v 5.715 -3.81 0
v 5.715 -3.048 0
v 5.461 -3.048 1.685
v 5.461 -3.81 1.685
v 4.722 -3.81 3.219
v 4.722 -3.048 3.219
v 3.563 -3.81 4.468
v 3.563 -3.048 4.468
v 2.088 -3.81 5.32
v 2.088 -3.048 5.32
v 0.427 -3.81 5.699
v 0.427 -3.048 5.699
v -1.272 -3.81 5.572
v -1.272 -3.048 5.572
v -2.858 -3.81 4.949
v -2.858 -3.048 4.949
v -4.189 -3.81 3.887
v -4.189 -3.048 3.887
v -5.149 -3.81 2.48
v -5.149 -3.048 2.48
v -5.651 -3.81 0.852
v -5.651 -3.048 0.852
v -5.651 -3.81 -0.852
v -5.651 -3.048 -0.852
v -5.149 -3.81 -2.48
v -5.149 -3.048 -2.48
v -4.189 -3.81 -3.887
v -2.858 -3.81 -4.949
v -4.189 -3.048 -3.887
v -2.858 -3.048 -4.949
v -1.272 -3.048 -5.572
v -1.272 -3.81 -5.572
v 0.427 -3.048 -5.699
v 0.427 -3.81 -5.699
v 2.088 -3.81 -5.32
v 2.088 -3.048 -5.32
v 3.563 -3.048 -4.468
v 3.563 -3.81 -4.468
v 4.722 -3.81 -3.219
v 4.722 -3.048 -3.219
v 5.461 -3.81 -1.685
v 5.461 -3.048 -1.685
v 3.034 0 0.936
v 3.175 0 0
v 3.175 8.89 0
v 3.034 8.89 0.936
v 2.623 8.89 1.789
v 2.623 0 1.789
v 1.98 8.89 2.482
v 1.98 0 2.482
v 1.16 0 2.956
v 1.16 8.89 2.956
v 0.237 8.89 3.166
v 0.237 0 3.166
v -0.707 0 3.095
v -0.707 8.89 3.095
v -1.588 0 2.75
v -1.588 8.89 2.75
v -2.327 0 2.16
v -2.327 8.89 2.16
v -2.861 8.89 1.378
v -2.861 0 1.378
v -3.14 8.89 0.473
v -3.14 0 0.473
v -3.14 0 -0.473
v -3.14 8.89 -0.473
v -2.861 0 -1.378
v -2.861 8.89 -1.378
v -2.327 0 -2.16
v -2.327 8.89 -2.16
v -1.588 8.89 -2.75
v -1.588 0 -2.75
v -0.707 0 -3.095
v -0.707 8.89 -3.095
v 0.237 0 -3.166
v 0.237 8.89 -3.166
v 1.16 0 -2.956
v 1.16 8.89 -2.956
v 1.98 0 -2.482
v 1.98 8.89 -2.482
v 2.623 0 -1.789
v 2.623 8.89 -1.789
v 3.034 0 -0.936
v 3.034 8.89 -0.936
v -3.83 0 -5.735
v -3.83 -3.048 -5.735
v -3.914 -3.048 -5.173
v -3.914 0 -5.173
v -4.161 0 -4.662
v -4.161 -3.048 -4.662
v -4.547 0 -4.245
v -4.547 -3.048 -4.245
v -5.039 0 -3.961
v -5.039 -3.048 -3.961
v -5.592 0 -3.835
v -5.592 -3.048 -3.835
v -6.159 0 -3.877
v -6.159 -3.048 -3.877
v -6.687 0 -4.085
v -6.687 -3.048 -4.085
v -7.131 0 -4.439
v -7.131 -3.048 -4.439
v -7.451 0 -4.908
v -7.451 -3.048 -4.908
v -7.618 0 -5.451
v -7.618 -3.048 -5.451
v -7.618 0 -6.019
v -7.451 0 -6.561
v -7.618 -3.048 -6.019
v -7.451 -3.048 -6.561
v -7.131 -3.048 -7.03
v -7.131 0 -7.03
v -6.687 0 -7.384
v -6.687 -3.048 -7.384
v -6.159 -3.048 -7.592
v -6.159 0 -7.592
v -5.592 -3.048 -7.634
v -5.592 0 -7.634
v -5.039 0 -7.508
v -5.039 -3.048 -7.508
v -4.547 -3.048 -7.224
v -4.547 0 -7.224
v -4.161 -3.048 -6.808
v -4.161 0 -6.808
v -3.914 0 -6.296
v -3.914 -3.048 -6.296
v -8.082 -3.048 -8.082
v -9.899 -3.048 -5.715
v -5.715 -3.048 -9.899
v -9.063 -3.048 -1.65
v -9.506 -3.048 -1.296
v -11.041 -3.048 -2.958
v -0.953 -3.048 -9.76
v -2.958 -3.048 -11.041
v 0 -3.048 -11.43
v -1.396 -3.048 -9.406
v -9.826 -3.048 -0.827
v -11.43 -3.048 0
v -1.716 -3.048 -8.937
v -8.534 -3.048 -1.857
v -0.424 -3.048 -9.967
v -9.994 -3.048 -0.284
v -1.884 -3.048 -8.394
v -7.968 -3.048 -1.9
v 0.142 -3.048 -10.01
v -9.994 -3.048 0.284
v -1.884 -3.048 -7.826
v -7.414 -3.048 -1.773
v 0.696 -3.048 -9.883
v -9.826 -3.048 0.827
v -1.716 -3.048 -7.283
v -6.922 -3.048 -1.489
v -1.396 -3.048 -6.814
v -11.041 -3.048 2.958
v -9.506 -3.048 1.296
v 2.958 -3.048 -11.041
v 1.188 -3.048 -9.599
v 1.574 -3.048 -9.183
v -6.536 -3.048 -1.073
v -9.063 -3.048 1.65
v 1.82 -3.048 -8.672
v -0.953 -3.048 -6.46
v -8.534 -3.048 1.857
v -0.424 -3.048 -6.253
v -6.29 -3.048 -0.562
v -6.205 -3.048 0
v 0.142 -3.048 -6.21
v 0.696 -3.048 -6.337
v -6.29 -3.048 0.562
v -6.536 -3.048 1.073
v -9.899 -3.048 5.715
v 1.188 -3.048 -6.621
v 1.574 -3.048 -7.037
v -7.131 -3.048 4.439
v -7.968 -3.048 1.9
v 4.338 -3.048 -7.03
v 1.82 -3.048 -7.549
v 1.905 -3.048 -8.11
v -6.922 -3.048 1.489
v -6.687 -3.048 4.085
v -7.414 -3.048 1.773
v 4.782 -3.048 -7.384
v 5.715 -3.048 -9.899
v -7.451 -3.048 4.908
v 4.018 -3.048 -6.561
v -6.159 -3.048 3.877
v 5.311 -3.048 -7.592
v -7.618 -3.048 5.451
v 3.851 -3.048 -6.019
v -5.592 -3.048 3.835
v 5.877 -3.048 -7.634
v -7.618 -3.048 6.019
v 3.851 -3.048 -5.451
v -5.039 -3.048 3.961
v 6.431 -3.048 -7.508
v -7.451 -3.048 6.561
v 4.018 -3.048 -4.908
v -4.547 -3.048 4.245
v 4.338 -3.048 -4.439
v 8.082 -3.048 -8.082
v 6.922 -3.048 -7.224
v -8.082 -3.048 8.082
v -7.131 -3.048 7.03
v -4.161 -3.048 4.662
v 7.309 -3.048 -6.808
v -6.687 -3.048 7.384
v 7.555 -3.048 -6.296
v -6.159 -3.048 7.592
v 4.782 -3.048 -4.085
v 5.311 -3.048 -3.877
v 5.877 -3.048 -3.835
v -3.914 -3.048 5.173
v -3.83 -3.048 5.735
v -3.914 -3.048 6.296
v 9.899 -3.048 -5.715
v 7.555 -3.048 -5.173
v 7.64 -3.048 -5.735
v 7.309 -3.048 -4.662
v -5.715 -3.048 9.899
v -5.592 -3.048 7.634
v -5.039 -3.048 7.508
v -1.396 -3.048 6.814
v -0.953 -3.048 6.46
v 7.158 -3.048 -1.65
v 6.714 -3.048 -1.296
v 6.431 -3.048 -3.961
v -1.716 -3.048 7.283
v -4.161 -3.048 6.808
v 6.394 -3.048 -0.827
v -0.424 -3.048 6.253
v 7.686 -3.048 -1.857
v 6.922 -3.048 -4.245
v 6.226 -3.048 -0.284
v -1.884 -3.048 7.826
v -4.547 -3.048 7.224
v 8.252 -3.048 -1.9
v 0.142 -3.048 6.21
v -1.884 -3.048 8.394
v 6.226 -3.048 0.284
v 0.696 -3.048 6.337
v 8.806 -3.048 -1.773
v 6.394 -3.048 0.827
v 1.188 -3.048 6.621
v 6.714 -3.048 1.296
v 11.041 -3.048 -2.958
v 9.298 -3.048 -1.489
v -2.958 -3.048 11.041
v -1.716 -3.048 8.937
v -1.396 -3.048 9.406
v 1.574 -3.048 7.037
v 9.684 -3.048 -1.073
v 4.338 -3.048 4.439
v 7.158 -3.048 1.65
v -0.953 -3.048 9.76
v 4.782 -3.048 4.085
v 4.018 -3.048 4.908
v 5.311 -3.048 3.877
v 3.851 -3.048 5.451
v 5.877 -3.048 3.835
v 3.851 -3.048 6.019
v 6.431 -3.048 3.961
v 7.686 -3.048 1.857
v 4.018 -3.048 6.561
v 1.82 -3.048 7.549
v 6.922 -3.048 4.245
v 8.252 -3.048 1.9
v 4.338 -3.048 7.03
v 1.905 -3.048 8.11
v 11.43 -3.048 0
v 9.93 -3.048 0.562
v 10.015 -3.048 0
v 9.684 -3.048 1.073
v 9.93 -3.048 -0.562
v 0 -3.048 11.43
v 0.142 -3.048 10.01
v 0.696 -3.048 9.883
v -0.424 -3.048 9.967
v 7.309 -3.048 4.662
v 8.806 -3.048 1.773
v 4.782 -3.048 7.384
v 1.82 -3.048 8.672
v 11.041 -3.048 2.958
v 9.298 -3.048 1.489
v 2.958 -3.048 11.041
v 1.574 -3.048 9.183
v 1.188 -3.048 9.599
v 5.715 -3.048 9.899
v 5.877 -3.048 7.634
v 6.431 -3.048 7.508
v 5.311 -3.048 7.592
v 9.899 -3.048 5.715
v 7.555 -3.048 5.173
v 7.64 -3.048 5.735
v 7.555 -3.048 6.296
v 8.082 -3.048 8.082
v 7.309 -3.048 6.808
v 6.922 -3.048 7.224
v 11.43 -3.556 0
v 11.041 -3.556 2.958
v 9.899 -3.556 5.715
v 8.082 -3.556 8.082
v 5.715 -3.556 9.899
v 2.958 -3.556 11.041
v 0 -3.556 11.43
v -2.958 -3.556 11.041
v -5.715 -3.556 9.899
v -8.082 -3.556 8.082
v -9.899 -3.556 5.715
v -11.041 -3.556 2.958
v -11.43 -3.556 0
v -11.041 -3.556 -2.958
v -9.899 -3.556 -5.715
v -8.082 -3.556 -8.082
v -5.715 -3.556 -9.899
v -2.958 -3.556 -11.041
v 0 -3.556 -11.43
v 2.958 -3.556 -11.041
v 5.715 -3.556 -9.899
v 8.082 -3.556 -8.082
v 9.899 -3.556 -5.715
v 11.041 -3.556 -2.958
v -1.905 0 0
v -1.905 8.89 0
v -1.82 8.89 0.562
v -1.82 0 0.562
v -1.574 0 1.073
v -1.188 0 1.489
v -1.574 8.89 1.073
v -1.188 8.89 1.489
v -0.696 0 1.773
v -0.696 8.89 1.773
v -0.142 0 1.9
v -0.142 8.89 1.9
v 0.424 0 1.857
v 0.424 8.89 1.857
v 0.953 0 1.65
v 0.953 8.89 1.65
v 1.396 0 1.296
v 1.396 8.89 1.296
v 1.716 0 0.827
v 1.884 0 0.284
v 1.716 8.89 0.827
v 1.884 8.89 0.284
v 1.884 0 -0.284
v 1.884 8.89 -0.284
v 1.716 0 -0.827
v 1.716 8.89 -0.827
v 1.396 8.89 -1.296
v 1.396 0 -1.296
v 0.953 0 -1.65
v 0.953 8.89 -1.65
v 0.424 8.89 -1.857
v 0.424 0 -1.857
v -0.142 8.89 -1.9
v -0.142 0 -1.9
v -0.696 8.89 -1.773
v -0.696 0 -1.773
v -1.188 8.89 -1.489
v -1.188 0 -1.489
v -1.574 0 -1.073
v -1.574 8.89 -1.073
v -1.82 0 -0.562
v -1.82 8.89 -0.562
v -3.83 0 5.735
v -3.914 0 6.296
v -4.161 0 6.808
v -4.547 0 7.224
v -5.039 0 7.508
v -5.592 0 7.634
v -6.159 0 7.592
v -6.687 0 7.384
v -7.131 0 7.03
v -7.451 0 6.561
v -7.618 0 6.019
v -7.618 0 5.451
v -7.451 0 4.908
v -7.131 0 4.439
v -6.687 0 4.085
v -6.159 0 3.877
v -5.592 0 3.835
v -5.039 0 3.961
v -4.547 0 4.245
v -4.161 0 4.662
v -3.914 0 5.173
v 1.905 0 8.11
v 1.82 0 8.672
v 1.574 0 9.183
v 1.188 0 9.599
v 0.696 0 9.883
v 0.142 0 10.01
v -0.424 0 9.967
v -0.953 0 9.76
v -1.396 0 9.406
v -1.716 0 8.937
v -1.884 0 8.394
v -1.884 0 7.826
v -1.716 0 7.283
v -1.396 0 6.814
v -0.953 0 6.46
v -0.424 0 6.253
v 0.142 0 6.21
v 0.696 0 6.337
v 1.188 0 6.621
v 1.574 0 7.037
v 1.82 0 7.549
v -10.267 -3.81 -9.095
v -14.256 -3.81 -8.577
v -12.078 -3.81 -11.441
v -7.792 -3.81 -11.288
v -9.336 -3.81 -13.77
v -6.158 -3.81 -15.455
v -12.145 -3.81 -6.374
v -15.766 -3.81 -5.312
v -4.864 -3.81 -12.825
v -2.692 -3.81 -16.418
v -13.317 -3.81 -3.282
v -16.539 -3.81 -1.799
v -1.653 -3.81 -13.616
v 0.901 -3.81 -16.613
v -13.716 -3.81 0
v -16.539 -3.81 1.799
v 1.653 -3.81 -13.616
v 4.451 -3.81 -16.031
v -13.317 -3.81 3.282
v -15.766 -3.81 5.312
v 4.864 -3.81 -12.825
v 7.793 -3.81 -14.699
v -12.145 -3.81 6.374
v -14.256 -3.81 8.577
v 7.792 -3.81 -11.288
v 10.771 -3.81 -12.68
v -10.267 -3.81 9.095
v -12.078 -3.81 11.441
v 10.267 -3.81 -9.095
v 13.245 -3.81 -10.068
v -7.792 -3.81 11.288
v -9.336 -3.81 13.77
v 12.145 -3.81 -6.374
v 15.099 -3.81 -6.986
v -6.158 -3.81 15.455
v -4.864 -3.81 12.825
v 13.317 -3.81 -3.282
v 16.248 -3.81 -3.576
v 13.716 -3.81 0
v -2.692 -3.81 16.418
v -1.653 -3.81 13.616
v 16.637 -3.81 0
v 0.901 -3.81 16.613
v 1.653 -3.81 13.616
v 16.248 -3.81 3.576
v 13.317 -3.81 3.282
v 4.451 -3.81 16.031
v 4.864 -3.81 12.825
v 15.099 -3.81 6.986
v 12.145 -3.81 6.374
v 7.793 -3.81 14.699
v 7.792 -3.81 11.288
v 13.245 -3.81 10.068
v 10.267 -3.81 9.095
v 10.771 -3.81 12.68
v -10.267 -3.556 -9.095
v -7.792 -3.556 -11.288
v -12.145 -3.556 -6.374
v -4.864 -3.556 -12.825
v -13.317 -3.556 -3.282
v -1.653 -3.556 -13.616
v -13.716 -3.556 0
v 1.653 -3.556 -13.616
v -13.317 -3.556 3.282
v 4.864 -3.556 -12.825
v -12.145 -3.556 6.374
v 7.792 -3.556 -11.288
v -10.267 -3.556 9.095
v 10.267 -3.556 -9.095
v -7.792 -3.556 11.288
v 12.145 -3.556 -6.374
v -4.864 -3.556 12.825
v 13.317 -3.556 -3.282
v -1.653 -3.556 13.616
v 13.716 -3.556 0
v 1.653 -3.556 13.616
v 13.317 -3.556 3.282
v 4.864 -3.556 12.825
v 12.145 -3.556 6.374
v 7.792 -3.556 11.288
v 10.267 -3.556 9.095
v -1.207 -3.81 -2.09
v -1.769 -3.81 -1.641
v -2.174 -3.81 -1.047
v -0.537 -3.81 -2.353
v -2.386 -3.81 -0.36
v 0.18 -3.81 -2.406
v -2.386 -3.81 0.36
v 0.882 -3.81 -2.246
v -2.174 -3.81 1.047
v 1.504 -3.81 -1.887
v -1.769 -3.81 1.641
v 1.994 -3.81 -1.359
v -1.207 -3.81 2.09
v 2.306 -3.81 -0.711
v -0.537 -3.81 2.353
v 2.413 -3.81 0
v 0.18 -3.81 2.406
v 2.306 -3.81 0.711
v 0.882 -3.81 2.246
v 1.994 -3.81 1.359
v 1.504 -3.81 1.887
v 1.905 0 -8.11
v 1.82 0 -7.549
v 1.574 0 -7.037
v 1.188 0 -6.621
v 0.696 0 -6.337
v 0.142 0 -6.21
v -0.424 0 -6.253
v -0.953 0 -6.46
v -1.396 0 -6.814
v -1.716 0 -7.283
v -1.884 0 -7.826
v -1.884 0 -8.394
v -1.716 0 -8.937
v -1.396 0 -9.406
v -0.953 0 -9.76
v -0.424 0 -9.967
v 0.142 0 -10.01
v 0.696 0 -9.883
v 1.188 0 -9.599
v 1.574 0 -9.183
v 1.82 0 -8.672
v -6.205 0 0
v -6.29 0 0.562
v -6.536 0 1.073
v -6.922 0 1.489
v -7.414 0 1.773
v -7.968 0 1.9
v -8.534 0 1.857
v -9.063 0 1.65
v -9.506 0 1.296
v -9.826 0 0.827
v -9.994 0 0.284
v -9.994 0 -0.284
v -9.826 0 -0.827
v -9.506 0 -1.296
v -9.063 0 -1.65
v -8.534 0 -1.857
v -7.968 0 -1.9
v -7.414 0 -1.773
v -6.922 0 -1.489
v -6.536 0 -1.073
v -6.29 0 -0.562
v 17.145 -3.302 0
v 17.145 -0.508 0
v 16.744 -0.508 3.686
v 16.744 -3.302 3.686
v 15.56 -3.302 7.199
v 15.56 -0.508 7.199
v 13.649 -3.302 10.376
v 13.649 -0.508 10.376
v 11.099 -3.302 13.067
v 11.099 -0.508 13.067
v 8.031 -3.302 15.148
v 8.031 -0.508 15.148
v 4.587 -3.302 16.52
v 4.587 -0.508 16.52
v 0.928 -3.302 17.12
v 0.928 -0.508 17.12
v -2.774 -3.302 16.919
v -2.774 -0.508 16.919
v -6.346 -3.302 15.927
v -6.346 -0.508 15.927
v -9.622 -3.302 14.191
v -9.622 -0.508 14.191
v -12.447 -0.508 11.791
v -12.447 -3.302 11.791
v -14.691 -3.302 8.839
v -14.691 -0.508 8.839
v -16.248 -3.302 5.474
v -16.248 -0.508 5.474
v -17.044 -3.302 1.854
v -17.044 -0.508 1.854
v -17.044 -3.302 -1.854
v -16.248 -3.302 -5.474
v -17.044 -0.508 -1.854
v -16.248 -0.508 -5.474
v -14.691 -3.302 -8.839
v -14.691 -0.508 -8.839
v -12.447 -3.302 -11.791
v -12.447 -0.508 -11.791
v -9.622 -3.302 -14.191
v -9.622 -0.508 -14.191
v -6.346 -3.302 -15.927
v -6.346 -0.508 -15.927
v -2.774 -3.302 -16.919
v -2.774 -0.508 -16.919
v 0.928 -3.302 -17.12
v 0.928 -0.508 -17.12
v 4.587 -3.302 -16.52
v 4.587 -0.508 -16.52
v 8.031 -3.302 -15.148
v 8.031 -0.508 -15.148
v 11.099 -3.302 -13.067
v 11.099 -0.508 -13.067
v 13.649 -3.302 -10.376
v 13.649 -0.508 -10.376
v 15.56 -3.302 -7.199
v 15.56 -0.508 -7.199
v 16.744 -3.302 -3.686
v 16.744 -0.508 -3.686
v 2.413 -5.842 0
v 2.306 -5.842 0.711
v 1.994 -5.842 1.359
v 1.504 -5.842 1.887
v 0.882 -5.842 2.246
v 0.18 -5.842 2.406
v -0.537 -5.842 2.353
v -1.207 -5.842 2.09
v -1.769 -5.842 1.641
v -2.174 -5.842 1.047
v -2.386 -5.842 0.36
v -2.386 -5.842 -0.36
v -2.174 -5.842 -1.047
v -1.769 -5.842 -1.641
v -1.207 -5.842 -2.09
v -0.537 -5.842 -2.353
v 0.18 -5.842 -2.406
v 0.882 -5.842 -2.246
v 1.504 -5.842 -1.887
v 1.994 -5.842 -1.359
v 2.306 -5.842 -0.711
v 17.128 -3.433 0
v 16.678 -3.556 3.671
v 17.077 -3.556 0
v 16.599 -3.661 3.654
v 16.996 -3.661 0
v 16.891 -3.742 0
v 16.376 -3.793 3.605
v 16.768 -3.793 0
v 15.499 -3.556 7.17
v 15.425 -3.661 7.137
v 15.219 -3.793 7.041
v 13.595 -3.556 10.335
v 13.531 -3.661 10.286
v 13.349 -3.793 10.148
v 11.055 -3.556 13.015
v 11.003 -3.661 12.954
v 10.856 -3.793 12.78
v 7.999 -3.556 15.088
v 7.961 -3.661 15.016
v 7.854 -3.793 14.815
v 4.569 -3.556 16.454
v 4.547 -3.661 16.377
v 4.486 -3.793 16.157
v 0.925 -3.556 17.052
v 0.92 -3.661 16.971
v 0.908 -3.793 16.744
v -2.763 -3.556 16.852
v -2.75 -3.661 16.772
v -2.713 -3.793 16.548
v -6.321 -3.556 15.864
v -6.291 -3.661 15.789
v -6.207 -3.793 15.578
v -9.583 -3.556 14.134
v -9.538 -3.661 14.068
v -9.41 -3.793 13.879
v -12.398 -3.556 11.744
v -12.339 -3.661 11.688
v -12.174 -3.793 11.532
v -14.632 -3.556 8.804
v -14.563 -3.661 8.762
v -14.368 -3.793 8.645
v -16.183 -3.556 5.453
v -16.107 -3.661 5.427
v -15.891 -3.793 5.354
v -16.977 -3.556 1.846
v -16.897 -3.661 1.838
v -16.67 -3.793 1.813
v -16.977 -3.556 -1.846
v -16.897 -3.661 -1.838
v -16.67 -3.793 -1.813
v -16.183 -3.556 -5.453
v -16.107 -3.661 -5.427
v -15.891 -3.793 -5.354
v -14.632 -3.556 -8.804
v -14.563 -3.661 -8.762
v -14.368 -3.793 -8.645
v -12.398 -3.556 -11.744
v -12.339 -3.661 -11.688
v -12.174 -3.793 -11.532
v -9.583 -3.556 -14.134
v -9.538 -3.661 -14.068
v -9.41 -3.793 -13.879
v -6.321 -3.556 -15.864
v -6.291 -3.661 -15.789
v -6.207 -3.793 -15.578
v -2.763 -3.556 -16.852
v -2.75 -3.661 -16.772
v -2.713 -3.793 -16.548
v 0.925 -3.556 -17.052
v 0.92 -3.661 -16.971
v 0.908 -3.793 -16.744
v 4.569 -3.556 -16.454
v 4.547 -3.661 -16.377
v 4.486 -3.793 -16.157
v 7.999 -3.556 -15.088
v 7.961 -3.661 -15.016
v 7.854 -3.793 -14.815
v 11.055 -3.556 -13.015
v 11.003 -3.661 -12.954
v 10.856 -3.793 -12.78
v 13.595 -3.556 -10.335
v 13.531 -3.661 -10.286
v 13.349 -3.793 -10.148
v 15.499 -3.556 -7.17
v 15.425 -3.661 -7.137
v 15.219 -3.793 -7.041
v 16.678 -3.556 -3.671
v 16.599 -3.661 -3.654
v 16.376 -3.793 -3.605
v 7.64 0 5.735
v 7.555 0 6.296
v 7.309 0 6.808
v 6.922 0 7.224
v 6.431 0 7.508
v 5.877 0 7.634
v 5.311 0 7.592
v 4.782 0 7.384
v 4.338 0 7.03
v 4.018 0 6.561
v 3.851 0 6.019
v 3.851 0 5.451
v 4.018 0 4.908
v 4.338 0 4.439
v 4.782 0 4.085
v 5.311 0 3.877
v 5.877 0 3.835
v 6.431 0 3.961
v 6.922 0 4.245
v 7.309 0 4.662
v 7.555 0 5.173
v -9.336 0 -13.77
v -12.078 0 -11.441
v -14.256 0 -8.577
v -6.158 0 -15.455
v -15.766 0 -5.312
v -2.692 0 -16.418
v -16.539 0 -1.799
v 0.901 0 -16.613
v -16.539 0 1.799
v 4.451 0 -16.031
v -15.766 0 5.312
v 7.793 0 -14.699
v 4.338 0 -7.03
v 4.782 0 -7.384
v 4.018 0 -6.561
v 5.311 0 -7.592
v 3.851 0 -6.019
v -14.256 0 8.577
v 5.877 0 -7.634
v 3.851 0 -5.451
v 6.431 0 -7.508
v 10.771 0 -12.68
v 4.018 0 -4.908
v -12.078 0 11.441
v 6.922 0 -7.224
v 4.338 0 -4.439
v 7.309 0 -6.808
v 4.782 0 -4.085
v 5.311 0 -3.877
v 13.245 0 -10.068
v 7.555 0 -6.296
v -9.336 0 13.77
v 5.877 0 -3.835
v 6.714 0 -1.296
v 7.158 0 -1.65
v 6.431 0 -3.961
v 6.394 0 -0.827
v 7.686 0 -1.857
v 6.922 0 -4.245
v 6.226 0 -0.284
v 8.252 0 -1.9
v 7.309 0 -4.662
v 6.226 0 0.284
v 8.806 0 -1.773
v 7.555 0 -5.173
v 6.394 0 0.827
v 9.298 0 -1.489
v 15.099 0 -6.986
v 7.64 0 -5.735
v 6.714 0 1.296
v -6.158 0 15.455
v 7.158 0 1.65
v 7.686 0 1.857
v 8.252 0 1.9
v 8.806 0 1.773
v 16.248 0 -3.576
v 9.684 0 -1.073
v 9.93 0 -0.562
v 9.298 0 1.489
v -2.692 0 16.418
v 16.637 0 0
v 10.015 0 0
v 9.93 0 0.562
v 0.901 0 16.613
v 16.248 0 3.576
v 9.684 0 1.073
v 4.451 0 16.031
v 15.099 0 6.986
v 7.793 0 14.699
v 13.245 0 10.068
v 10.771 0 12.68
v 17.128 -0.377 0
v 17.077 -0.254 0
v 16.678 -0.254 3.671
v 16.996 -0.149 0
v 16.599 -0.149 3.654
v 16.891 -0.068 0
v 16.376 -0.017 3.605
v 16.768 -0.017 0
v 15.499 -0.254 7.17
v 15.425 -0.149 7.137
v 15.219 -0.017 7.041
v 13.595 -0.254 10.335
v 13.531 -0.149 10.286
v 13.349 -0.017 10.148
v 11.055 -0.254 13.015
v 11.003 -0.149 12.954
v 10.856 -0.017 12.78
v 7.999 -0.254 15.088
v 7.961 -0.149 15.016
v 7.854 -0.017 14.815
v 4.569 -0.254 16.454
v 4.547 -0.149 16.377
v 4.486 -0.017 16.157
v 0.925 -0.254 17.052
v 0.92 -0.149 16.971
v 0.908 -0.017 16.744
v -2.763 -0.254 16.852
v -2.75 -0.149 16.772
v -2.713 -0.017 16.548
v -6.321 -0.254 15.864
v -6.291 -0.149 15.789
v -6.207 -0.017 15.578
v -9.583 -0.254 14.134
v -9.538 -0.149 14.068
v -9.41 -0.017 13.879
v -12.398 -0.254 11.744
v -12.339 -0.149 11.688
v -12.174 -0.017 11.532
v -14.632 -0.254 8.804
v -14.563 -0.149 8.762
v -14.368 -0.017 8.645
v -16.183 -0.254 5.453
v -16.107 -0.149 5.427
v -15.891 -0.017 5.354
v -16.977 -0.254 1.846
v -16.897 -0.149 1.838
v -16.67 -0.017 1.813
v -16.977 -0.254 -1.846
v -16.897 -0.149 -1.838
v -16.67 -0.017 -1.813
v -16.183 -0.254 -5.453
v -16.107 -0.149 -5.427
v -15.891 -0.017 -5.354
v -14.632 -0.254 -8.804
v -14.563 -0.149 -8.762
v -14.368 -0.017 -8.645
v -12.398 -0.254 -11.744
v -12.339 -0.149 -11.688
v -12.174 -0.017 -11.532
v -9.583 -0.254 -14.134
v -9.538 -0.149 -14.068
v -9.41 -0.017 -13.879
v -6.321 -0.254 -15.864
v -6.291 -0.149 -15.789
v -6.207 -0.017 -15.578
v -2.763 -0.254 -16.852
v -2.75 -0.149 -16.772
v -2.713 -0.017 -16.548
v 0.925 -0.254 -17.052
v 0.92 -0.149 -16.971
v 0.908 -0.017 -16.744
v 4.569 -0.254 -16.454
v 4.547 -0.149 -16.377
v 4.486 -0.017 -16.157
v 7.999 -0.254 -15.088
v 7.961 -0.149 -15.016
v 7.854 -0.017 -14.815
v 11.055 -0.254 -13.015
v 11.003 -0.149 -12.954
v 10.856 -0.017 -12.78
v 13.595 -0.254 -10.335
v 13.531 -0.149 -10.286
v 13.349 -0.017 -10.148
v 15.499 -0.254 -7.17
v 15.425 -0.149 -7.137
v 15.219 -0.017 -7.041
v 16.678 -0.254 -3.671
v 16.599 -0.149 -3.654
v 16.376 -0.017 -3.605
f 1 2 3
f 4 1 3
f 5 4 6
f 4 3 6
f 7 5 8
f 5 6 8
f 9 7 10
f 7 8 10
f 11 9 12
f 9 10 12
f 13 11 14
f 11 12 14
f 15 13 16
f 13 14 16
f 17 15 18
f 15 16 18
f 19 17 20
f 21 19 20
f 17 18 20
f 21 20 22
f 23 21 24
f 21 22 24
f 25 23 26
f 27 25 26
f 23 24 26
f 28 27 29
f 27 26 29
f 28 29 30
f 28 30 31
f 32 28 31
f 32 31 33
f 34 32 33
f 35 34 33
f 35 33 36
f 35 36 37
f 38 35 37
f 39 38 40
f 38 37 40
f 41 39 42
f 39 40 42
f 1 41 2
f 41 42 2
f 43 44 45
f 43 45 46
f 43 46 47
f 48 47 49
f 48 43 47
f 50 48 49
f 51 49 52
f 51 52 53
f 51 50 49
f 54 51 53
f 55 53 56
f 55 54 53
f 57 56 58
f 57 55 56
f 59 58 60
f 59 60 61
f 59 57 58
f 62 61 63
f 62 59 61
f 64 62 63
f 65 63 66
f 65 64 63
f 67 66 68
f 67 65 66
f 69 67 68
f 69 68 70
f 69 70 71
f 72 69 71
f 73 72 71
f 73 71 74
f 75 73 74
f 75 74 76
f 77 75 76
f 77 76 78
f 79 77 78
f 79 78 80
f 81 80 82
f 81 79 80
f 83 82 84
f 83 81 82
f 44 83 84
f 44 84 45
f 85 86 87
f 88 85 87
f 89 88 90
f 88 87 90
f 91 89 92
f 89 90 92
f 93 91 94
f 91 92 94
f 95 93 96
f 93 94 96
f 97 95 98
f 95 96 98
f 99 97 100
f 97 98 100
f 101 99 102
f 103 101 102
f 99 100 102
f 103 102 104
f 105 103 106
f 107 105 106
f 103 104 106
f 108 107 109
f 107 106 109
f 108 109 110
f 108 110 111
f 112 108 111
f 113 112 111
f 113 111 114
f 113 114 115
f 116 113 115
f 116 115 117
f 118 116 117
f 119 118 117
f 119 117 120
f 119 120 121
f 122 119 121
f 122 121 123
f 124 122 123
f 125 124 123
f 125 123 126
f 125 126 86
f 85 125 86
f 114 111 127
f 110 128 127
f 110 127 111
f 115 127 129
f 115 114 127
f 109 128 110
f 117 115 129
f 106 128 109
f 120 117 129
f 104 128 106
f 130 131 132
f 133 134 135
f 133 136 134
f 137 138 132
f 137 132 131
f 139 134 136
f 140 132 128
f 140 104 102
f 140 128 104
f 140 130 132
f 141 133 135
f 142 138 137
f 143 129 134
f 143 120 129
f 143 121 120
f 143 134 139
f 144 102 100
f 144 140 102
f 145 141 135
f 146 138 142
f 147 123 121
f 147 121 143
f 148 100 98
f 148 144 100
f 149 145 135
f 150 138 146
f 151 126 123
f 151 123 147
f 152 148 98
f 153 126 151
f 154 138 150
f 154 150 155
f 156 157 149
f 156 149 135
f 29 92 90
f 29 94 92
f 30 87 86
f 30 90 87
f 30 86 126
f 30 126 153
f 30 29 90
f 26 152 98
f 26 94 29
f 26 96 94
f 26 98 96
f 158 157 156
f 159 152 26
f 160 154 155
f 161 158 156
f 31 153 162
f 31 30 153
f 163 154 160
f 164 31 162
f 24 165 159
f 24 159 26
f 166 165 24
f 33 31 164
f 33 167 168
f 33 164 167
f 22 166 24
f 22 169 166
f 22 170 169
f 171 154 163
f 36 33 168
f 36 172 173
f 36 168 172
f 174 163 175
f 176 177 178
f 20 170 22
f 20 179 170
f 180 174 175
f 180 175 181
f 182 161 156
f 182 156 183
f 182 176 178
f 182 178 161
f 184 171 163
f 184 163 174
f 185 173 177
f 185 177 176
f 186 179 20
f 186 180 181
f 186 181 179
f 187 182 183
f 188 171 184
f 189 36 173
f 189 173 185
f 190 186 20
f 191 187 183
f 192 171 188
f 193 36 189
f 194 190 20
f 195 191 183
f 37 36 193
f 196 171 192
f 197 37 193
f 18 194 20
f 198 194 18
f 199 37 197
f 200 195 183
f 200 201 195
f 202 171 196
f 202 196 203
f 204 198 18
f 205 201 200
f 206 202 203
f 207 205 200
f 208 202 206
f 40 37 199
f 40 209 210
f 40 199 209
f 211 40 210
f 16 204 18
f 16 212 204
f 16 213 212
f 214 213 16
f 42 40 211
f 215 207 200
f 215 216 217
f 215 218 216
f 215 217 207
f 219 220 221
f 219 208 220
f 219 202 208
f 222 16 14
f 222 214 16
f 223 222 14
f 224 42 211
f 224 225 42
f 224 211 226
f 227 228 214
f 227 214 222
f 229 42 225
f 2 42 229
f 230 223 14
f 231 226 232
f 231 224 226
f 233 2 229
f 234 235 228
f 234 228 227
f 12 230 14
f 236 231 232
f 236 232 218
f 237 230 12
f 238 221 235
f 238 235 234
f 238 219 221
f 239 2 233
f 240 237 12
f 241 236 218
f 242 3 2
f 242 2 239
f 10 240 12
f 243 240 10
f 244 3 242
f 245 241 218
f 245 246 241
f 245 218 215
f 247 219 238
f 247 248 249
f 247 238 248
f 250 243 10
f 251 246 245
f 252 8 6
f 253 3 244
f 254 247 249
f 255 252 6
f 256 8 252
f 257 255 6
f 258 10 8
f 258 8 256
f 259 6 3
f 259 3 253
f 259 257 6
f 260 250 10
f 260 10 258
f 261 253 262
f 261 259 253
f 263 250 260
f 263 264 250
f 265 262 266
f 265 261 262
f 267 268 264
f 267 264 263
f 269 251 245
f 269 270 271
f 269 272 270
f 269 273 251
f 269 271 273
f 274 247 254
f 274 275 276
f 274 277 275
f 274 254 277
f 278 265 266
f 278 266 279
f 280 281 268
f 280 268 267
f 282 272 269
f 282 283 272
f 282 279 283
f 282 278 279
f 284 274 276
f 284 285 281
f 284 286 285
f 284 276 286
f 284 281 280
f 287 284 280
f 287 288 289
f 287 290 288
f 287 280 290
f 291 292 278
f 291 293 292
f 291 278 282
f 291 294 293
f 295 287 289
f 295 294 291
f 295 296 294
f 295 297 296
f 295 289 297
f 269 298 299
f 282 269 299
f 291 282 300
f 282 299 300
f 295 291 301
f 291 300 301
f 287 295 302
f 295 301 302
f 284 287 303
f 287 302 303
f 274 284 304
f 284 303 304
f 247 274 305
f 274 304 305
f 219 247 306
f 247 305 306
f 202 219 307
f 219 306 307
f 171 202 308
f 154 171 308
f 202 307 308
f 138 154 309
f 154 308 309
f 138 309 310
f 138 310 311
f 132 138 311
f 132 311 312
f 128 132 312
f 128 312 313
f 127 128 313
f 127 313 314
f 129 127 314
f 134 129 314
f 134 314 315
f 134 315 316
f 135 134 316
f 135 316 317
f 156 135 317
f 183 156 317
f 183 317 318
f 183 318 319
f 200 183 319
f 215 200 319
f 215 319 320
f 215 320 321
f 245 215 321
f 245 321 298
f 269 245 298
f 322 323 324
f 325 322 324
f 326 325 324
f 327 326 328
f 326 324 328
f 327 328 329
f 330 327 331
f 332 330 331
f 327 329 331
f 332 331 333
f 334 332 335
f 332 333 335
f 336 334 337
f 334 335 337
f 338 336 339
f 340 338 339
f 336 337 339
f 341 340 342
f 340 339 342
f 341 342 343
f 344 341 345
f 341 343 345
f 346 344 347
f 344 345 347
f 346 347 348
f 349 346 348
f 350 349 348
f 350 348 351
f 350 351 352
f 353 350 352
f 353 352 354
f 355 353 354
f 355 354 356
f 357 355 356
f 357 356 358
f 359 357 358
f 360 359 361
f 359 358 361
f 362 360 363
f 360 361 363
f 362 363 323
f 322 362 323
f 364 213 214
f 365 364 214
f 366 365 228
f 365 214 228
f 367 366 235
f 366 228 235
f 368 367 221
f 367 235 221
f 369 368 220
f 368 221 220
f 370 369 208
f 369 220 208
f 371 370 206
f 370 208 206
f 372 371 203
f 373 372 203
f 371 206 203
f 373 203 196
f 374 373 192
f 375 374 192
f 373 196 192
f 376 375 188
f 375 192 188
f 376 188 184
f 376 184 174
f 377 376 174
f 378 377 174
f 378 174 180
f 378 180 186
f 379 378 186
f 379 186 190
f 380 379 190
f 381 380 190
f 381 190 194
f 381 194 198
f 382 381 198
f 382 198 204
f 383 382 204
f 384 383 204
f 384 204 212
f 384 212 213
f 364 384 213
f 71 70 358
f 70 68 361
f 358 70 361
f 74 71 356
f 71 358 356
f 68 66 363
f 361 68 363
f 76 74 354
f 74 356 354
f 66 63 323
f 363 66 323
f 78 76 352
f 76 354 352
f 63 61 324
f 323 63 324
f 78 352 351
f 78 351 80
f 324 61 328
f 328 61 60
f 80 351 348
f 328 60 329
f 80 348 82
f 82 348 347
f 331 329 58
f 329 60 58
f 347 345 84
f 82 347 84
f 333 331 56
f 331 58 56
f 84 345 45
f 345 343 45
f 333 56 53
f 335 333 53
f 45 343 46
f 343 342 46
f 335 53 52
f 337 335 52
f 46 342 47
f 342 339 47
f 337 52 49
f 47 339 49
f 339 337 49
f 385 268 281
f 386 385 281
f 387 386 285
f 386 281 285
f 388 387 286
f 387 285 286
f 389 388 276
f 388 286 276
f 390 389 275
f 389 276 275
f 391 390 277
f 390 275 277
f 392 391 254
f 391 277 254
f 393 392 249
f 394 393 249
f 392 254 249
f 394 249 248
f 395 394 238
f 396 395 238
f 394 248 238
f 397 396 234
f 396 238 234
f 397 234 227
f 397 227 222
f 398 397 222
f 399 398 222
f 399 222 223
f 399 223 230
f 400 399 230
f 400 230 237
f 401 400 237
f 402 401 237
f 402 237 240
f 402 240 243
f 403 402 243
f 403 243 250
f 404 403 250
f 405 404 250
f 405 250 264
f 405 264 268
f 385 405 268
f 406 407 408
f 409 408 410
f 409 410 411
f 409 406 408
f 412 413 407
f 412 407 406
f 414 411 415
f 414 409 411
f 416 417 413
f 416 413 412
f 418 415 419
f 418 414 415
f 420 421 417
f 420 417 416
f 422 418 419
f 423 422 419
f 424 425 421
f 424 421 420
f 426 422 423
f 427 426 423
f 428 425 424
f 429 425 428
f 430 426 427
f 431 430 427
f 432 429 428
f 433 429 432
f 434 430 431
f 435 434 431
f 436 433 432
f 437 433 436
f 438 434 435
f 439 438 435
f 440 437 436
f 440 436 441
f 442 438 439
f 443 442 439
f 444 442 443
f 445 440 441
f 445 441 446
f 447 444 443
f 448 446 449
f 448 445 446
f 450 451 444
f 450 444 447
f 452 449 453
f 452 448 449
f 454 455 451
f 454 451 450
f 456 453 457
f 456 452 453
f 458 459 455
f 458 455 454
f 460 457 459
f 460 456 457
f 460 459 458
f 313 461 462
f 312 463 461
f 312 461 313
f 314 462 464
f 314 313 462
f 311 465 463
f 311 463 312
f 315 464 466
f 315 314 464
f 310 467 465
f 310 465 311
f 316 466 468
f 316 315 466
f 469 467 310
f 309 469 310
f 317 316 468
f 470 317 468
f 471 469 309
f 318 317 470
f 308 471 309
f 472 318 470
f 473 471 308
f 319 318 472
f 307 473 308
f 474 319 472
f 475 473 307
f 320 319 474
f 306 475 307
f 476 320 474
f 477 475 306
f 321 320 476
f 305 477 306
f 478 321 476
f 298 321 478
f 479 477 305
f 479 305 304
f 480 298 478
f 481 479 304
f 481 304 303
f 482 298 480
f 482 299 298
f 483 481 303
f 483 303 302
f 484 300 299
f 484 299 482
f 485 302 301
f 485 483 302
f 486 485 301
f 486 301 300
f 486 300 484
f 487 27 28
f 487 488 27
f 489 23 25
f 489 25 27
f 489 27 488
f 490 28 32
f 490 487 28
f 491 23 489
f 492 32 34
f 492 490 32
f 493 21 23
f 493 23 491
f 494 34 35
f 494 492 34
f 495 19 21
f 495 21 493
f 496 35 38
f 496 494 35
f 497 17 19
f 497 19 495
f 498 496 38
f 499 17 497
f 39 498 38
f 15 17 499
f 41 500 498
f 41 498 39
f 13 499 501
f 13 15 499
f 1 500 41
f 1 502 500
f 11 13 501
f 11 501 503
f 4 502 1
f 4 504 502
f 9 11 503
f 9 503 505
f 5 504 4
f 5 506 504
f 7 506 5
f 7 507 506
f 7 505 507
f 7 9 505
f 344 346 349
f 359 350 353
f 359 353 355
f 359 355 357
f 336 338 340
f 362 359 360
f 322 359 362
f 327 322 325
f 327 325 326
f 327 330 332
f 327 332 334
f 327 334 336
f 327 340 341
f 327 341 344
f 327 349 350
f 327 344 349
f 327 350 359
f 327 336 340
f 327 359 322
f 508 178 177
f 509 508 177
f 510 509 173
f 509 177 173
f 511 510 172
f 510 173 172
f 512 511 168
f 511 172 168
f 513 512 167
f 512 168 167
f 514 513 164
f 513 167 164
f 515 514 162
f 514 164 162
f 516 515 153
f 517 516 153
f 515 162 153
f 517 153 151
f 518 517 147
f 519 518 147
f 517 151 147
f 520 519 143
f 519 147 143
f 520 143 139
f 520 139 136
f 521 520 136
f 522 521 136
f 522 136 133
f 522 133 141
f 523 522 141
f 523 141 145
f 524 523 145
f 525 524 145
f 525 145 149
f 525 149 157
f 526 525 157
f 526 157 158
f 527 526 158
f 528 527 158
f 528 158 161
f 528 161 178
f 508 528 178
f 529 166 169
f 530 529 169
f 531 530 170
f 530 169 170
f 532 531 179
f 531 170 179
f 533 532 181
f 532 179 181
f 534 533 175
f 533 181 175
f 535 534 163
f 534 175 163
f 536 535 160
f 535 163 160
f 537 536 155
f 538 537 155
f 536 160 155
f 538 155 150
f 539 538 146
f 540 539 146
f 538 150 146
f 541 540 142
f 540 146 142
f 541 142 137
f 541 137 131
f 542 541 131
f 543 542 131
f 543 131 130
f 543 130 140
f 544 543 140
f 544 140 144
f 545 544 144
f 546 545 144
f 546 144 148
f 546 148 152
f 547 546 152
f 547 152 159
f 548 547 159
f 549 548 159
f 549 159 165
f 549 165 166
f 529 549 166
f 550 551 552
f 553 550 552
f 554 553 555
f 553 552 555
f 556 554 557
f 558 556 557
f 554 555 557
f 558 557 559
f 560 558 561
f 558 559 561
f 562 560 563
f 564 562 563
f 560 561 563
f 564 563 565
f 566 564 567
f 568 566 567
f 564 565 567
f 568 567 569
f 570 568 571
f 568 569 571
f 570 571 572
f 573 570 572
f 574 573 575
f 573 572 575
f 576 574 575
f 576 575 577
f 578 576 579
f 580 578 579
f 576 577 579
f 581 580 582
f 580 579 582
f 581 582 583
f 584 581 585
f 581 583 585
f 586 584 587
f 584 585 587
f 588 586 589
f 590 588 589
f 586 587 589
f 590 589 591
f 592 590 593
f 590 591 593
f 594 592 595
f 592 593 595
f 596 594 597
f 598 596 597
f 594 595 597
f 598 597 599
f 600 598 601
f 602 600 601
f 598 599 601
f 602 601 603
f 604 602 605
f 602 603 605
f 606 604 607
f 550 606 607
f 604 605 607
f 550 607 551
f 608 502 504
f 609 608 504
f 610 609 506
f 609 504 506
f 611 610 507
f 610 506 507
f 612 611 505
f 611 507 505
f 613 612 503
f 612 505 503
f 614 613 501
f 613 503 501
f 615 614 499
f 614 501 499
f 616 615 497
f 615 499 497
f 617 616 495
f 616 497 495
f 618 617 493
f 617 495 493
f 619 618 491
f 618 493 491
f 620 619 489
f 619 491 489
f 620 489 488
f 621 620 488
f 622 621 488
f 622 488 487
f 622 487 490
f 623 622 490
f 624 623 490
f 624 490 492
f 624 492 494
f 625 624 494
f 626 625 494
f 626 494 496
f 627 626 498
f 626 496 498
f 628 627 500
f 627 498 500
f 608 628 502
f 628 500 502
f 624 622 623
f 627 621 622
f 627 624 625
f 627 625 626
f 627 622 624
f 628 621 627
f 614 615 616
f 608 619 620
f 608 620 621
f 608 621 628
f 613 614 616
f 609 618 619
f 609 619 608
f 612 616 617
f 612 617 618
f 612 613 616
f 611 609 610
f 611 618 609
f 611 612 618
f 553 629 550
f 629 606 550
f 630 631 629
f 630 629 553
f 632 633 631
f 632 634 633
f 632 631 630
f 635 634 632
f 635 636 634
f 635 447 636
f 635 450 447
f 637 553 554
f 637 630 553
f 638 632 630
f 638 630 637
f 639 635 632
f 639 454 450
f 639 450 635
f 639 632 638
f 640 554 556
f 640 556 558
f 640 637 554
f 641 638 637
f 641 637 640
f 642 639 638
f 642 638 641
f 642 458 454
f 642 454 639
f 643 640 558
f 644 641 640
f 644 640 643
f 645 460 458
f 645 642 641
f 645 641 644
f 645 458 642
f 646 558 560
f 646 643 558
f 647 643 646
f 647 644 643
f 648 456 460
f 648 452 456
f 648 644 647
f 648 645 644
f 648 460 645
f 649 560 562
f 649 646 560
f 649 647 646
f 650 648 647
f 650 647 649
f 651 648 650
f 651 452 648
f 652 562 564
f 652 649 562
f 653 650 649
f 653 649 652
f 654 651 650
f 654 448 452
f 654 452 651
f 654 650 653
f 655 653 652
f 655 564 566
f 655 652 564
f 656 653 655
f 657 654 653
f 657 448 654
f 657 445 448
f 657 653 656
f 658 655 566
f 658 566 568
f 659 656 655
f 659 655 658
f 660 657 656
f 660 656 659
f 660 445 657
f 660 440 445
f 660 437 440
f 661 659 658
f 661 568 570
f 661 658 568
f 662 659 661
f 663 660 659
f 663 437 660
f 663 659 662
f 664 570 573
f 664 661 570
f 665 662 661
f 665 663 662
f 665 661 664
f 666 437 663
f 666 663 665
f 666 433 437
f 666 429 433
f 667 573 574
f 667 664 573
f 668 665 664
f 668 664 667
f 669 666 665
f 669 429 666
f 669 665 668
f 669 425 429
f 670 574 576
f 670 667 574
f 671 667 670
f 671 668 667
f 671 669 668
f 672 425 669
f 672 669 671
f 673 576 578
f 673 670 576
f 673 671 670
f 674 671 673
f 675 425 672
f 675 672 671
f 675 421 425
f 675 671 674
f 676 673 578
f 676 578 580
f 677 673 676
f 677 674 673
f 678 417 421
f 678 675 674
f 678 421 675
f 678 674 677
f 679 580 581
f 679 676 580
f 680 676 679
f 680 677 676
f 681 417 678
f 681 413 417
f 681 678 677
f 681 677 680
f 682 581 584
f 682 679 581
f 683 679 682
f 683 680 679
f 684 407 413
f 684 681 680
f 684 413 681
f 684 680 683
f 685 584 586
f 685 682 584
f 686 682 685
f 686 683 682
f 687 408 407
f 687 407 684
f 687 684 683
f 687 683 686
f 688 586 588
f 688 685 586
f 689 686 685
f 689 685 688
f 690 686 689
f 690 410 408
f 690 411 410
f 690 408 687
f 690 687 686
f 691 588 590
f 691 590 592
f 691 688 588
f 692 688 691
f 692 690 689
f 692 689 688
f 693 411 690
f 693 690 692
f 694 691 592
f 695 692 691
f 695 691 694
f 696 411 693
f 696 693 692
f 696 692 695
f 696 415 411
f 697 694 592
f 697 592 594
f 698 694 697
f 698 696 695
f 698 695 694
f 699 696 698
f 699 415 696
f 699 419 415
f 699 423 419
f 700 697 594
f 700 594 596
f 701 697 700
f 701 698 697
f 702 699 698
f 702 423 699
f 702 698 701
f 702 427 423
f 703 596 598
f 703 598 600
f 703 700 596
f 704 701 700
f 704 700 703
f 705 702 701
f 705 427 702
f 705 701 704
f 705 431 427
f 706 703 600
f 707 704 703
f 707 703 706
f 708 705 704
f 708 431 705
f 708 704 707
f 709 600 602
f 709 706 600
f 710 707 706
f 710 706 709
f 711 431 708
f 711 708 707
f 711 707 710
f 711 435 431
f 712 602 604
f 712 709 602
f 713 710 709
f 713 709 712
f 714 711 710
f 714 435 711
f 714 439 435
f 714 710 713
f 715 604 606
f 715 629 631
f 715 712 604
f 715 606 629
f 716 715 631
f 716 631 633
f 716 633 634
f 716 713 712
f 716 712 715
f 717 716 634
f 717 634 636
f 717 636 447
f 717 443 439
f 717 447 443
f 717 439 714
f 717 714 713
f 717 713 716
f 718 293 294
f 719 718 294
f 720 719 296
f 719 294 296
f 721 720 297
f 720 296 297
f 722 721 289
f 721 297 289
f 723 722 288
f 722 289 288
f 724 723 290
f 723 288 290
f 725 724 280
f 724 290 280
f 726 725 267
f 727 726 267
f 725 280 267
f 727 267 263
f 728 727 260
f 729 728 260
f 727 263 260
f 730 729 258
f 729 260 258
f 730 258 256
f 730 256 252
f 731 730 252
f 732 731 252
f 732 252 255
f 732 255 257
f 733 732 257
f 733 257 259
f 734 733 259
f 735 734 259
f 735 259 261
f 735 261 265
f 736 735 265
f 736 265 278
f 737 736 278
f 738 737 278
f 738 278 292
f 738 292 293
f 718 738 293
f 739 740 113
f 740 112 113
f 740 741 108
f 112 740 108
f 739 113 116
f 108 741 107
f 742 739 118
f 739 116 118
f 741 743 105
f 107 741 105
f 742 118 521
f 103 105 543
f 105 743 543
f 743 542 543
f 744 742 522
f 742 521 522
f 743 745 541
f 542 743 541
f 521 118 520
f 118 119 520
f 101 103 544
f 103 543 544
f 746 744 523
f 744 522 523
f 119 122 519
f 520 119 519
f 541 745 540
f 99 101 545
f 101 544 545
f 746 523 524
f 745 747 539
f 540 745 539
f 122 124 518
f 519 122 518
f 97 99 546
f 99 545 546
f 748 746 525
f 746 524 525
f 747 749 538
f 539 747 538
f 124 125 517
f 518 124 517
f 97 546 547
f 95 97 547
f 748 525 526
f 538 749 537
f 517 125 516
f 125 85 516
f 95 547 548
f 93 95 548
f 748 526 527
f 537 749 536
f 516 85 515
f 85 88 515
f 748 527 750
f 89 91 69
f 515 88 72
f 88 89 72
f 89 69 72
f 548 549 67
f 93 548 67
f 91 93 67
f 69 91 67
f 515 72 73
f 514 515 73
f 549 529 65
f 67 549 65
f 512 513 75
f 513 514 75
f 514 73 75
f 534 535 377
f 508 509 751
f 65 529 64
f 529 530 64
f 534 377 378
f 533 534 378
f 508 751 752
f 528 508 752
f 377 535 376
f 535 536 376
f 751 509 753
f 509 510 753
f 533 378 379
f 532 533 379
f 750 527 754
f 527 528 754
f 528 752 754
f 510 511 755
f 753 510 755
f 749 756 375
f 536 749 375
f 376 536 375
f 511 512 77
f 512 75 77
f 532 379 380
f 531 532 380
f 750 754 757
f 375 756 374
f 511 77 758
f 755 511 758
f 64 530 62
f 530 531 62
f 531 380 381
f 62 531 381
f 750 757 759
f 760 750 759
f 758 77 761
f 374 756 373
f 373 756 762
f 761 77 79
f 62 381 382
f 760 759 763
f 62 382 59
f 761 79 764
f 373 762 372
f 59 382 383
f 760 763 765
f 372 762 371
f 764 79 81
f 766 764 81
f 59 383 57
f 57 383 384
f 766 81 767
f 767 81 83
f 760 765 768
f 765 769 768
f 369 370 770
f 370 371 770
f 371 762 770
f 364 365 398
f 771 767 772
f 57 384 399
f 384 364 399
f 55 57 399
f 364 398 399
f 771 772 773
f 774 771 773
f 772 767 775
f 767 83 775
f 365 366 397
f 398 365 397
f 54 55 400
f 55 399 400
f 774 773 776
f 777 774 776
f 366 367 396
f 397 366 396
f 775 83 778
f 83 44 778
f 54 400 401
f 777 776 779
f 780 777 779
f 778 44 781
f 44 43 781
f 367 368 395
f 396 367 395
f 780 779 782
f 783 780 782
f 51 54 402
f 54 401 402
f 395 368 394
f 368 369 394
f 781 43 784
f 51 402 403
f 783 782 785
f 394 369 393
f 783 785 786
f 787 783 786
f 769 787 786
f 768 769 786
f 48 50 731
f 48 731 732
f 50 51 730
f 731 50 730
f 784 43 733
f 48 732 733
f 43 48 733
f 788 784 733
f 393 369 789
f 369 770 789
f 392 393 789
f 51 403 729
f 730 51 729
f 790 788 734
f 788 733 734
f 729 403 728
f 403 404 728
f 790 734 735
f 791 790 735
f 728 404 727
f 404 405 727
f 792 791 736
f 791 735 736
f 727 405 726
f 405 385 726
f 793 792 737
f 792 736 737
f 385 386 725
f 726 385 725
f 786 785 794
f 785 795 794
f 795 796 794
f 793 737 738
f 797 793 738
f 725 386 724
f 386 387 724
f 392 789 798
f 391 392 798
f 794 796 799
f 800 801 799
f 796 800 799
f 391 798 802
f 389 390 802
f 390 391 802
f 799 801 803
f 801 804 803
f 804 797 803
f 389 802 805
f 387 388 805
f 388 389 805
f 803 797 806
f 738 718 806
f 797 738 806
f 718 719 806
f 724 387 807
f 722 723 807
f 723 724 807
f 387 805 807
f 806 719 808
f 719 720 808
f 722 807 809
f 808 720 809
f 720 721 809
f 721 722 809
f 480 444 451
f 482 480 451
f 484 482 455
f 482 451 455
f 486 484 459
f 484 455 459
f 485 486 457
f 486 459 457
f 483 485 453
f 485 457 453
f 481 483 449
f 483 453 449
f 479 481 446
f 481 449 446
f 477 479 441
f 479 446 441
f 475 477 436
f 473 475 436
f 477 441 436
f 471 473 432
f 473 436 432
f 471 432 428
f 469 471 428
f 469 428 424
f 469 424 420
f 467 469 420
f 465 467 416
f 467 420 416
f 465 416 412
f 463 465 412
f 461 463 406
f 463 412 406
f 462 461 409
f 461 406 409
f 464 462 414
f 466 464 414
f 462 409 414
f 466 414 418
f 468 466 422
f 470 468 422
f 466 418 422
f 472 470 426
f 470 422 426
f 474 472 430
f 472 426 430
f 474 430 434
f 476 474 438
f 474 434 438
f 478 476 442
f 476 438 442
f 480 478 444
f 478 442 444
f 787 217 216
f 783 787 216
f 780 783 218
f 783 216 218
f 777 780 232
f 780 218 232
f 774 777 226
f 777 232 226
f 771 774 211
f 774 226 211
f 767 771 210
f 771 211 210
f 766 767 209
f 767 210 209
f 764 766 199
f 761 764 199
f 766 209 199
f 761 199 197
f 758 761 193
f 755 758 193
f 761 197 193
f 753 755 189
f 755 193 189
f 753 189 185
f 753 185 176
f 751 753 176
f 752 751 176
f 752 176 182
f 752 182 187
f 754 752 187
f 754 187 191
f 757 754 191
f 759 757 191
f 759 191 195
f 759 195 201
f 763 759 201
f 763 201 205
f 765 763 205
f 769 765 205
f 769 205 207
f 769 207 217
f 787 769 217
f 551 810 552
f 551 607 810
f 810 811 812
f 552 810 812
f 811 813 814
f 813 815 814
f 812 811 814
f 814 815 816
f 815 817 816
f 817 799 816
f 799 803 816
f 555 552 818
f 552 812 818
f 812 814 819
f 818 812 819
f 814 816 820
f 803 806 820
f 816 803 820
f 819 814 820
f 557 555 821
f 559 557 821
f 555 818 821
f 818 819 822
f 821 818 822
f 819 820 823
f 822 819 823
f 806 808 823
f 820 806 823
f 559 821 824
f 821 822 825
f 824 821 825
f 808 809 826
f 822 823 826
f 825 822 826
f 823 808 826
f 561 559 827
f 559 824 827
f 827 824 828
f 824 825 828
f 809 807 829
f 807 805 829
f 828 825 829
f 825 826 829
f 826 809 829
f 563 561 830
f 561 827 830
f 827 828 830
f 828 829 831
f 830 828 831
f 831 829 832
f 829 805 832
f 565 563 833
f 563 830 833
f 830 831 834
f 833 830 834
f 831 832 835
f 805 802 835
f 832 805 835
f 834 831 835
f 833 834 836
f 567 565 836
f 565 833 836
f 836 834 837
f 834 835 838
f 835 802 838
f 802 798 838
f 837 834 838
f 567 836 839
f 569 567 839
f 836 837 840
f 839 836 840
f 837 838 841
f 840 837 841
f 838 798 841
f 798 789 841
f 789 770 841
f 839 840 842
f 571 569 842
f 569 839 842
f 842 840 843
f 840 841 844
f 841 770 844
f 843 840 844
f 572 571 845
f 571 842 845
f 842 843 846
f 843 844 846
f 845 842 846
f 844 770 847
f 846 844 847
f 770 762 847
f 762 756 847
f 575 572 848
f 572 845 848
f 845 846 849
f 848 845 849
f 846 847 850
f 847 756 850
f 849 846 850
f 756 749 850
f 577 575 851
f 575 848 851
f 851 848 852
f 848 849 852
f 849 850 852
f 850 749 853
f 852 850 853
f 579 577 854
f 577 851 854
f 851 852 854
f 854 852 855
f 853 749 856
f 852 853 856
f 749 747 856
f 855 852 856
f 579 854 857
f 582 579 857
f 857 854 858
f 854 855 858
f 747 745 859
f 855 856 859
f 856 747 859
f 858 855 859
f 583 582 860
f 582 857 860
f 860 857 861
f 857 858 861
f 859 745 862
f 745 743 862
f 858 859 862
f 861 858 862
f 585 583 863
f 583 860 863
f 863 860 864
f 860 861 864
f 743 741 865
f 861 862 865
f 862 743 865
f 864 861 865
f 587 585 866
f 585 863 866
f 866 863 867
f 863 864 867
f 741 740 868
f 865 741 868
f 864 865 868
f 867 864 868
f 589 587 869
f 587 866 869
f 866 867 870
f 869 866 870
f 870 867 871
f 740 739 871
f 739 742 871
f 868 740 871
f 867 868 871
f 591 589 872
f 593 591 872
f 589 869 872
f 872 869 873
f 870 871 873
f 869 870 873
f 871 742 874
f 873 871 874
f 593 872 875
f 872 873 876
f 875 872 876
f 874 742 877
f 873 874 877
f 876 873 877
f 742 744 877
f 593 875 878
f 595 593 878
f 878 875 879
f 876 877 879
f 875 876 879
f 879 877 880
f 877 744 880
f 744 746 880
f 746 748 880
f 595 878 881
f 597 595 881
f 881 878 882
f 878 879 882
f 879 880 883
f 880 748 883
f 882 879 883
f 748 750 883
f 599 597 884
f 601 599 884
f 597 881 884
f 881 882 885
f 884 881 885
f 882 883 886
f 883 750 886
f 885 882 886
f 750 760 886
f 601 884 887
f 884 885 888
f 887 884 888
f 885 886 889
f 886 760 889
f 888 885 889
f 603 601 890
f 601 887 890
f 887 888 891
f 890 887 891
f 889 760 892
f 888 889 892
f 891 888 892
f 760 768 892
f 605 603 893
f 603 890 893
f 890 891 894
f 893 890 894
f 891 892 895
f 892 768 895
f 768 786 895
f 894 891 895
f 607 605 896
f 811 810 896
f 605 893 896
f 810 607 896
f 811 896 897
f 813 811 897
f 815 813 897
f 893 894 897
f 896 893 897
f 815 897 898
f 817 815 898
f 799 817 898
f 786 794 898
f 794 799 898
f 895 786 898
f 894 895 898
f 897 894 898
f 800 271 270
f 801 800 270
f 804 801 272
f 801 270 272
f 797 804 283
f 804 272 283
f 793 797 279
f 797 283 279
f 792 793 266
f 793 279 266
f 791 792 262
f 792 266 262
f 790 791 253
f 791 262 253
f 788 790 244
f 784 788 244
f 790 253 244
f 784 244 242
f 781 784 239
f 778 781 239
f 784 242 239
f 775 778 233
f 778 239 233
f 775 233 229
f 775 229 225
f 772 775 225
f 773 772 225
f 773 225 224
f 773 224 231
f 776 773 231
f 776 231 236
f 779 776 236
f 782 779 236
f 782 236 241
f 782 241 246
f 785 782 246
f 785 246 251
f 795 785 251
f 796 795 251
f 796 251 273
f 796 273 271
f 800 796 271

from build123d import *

# Parameters (mm, degrees)
F0_R      = 17.145
F1_DEPTH  = 3.81
F2_R      = 13.716
F2_R_2    = 11.43
F3_DEPTH  = 0.254
F4_DEPTH  = 0.762
F5_R      = 5.715
F6_DEPTH  = 0.762
F8_R      = 1.905
F9_DEPTH  = 25.4
F10_R     = 2.413
F11_DEPTH = 2.032
F14_R     = 3.175
F15_DEPTH = 8.89
F16_R     = 1.905
F17_DEPTH = 8.89
F18_R     = 0.508
F19_R     = 0.508


# Not quite as in the source:
# - the program builds the solid bodies; features that only make, move or delete a surface that nothing else refers to are left out


with BuildPart() as f1:
    # F0 (on Front) → F1 (new body)
    with BuildSketch(Plane.XZ):
        Circle(F0_R)
    extrude(amount=F1_DEPTH)

    # F2 (on face) → F3 (cut)
    with BuildSketch(Plane.XZ.offset(3.81)):
        Circle(F2_R)
        Circle(F2_R_2, mode=Mode.SUBTRACT)
    extrude(amount=-F3_DEPTH, mode=Mode.SUBTRACT)

    # F4 (cut): a face of the model
    f4_faces = [f1.faces().sort_by_distance(p)[0] for p in [
        (0, -3.81, 0),
    ]]
    extrude(f4_faces, amount=-F4_DEPTH, mode=Mode.SUBTRACT)

    # F5 (on face) → F6 (join)
    with BuildSketch(Plane.XZ.offset(3.048)):
        Circle(F5_R)
    extrude(amount=F6_DEPTH)

    # F8 (on face) → F9 (cut)
    with BuildSketch(Plane.XZ.offset(3.048)):
        with Locations((0, 8.1100180022)):
            Circle(F8_R)
        with Locations((-5.7346487249, 5.7346487249)):
            Circle(F8_R)
        with Locations((-5.7346487249, -5.7346487249)):
            Circle(F8_R)
        with Locations((0, -8.1100180022)):
            Circle(F8_R)
        with Locations((5.7346487249, -5.7346487249)):
            Circle(F8_R)
        with Locations((8.1100180022, 0)):
            Circle(F8_R)
        with Locations((5.7346487249, 5.7346487249)):
            Circle(F8_R)
        with Locations((-8.1100180022, 0)):
            Circle(F8_R)
    extrude(amount=-F9_DEPTH, mode=Mode.SUBTRACT)

    # F10 (on face) → F11 (join)
    with BuildSketch(Plane.XZ.offset(3.81)):
        Circle(F10_R)
    extrude(amount=F11_DEPTH)

    # F14 (on Front) → F15 (join)
    with BuildSketch(Plane.XZ):
        Circle(F14_R)
    extrude(amount=-F15_DEPTH)

    # F16 (on face) → F17 (cut)
    with BuildSketch(Plane(origin=(0, 8.89, 0), x_dir=(-1, 0, 0), z_dir=(0, 1, 0))):
        Circle(F16_R)
    extrude(amount=-F17_DEPTH, mode=Mode.SUBTRACT)

    # F18
    f18_edges = [f1.edges().sort_by_distance(p)[0] for p in [
        (-17.145, -3.81, 0),
    ]]
    fillet(f18_edges, radius=F18_R)

    # F19
    f19_edges = [f1.edges().sort_by_distance(p)[0] for p in [
        (-17.145, 0, 0),
    ]]
    fillet(f19_edges, radius=F19_R)


solid = f1.part
